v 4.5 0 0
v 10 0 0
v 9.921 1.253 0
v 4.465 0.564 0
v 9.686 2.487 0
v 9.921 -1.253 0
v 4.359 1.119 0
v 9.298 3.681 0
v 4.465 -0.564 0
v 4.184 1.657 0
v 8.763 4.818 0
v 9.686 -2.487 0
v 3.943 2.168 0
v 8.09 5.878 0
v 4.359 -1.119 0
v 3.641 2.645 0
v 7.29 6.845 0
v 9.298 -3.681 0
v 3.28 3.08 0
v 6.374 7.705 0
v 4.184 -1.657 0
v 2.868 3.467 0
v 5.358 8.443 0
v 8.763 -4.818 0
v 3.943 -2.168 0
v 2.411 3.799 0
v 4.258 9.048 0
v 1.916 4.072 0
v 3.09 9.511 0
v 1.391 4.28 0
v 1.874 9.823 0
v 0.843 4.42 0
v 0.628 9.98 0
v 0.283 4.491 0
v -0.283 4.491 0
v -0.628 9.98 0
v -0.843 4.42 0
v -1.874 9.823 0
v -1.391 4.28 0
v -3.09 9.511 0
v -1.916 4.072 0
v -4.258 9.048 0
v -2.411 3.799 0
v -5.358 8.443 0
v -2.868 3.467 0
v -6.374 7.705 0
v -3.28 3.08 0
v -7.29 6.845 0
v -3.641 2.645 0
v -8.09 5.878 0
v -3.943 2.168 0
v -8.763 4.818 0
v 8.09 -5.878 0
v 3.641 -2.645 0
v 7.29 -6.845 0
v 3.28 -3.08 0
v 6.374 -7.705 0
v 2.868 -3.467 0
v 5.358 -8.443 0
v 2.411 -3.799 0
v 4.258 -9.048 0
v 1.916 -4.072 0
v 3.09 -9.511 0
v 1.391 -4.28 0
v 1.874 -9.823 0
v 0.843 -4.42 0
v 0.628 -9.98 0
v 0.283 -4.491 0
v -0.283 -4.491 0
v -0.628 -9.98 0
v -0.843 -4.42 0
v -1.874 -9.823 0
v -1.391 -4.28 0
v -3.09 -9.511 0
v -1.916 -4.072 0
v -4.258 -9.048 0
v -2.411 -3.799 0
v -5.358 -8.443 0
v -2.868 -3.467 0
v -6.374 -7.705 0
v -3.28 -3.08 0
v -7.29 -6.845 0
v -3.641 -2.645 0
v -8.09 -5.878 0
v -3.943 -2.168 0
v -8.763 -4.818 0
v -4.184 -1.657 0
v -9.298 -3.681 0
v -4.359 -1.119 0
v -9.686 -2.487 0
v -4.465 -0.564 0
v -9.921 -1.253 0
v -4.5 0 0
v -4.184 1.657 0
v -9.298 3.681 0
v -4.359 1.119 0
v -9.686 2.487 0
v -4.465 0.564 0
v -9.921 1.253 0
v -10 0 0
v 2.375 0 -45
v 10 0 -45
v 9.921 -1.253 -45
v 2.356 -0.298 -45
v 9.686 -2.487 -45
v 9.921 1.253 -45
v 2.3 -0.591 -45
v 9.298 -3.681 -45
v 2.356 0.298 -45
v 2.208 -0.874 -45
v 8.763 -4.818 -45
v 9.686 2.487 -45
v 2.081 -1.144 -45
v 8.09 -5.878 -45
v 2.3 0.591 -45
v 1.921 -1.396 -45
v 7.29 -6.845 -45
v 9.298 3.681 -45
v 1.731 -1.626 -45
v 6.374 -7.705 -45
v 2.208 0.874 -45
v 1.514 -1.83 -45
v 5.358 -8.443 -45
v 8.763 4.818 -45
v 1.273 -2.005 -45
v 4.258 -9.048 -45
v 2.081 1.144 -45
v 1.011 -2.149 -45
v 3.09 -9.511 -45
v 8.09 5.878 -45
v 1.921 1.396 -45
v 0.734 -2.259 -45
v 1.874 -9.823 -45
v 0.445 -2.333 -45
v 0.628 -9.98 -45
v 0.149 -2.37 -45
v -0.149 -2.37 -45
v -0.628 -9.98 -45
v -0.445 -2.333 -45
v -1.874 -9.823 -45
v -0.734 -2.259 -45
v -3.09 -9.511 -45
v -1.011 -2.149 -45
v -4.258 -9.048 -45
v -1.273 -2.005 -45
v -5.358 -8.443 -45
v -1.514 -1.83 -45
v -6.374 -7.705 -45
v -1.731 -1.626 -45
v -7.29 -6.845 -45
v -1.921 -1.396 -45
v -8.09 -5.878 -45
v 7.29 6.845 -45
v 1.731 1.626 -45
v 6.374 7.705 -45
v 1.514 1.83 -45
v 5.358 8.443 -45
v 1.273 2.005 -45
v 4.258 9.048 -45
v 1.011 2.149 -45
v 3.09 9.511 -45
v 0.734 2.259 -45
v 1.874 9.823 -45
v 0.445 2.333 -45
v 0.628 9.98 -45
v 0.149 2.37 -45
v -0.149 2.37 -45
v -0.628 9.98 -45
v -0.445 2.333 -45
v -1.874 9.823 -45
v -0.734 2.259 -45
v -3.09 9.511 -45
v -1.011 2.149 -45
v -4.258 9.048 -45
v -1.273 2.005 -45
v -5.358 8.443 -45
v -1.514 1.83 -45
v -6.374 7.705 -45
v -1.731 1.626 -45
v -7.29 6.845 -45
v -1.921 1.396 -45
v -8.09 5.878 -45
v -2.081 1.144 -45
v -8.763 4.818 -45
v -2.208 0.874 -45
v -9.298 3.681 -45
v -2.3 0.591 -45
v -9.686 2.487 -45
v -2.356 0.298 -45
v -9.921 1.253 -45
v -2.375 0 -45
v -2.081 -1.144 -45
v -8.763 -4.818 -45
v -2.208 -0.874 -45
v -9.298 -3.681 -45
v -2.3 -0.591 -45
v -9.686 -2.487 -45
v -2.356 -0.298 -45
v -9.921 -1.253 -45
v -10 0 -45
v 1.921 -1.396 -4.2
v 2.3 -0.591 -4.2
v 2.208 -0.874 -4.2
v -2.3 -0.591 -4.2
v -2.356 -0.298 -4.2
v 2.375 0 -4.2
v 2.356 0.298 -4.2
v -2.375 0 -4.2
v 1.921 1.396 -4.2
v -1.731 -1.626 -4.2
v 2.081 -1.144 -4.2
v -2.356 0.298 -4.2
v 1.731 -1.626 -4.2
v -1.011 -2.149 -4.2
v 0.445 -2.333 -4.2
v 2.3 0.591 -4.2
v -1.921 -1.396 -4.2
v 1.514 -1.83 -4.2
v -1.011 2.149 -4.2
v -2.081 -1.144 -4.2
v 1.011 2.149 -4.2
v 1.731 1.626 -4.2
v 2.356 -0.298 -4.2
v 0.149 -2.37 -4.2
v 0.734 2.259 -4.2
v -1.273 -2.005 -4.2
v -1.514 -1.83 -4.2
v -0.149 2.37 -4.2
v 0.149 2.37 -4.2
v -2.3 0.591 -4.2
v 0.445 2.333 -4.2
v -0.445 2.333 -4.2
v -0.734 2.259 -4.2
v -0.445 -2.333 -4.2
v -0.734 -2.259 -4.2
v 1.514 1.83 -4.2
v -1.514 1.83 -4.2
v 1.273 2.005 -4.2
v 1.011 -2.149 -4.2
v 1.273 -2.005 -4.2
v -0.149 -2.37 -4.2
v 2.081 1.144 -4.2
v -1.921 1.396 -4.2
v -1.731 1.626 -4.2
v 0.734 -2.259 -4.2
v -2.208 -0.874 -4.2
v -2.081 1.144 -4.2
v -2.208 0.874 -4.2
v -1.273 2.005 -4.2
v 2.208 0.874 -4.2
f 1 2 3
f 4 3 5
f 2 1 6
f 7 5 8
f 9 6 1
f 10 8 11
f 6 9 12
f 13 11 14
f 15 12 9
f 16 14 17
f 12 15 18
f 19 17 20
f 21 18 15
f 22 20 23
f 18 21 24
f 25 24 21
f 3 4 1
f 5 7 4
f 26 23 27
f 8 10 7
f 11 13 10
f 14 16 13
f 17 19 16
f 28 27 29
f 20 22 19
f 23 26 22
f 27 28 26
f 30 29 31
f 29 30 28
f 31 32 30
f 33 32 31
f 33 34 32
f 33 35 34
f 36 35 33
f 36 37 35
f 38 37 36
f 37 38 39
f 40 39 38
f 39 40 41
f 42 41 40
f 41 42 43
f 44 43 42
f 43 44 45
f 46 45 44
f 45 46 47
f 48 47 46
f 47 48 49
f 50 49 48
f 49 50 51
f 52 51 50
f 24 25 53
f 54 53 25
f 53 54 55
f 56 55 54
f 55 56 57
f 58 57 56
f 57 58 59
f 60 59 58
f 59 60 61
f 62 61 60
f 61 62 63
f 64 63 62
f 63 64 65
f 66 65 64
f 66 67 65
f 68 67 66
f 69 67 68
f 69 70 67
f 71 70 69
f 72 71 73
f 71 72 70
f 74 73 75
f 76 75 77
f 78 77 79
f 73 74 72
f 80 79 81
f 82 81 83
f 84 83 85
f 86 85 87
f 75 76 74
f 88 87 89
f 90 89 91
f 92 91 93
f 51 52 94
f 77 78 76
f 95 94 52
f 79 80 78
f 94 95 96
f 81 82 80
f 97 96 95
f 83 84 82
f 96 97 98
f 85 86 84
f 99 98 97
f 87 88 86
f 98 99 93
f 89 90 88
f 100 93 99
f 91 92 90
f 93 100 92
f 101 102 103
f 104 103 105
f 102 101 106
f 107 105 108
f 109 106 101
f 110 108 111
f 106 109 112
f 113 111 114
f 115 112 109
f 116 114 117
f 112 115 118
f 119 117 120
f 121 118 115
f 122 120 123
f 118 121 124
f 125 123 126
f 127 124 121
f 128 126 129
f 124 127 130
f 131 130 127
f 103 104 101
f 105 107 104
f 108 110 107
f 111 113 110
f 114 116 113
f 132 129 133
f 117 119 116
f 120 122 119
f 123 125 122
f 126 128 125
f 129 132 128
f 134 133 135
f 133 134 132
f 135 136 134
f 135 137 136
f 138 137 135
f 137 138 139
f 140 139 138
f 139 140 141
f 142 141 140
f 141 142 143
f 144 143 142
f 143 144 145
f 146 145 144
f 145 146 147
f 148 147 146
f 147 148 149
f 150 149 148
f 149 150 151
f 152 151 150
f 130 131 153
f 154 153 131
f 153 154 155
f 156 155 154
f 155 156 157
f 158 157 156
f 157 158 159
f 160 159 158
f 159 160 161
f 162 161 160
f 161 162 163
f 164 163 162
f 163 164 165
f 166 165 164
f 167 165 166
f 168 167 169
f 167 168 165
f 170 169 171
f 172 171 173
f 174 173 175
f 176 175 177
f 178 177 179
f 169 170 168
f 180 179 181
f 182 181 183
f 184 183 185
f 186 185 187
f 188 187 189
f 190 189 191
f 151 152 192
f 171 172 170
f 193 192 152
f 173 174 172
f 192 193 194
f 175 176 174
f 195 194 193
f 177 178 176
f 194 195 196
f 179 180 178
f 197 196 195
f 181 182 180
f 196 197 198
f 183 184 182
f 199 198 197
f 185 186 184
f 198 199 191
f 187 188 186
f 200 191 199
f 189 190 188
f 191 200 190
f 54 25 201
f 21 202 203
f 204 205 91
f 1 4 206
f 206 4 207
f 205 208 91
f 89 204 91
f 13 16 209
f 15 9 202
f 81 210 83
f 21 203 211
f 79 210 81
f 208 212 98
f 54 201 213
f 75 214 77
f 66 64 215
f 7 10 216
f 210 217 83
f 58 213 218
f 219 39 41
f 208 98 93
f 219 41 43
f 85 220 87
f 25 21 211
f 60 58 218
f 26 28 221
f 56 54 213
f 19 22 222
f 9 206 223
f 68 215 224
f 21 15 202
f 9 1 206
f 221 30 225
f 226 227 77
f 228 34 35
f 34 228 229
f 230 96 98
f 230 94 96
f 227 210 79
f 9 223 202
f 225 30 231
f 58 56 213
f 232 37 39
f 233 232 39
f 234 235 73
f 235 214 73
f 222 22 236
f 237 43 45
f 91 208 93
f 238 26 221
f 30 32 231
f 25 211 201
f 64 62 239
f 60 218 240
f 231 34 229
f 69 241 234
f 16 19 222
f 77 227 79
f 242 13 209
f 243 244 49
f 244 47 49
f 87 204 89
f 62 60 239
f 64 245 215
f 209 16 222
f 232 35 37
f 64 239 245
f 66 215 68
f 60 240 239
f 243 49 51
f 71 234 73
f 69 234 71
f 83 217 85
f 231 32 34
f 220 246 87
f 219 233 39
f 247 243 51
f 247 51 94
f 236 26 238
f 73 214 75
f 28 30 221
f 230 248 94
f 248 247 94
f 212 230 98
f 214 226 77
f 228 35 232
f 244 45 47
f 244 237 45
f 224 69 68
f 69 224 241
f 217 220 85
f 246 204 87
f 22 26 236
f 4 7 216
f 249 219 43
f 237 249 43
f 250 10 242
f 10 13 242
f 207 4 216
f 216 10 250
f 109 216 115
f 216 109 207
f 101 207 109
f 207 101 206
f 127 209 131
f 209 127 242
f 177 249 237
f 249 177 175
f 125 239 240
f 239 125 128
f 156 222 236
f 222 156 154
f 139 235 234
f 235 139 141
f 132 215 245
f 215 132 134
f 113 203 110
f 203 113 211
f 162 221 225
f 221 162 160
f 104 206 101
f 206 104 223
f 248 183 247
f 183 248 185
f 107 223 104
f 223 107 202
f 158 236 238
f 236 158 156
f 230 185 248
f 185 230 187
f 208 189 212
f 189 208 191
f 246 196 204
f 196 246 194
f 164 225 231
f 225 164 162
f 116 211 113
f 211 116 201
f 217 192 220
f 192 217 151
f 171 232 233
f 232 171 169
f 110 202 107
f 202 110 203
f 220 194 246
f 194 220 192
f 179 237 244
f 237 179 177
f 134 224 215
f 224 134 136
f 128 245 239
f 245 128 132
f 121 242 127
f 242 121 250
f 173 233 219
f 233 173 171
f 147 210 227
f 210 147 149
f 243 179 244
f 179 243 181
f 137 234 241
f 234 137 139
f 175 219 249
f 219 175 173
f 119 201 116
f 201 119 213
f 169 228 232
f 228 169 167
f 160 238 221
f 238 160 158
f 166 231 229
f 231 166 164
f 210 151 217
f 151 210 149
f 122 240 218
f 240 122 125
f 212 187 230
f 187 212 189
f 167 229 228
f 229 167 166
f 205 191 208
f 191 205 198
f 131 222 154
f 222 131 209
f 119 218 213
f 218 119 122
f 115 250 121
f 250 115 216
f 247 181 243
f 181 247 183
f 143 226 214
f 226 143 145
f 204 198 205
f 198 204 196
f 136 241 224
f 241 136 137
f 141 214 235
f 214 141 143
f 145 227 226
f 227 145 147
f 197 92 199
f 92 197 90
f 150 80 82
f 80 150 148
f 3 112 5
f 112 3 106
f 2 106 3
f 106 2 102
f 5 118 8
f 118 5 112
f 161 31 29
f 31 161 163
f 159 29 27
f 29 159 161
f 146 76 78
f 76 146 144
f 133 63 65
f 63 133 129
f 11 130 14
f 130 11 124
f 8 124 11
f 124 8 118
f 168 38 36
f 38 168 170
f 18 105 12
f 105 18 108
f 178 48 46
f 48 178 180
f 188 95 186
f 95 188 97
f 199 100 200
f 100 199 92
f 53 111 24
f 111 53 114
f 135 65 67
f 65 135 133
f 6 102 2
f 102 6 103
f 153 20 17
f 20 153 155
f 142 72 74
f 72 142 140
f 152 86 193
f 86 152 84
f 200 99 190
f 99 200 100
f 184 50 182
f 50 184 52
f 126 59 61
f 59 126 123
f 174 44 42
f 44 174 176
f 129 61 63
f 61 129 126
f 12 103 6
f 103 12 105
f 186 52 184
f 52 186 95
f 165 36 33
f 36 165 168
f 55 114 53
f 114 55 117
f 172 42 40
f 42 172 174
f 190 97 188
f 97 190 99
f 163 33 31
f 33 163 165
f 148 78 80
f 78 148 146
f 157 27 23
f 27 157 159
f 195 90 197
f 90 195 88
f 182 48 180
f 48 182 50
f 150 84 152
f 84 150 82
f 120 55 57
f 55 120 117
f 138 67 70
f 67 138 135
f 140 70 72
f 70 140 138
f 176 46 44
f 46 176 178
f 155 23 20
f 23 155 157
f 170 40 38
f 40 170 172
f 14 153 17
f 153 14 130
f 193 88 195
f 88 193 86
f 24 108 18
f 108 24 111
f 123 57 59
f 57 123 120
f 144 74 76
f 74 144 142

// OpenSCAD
$fn = 50;


difference() {
	union() {
		translate(v = [0, 0, -45.0000000000]) {
			cylinder(h = 45, r = 10.0000000000);
		}
		cylinder(h = 0, r = 19.0000000000);
	}
	union() {
		translate(v = [0, 0, 0]) {
			rotate(a = [0, 0, 0]) {
				difference() {
					union() {
						#translate(v = [0, 0, -45.0000000000]) {
							cylinder(h = 45, r = 2.2500000000);
						}
						#translate(v = [0, 0, -4.2000000000]) {
							cylinder(h = 4.2000000000, r = 10.0000000000, r1 = 2.3750000000, r2 = 4.5000000000);
						}
						#translate(v = [0, 0, -45.0000000000]) {
							cylinder(h = 45, r = 2.3750000000);
						}
						#translate(v = [0, 0, -45.0000000000]) {
							cylinder(h = 45, r = 2.2500000000);
						}
					}
					union();
				}
			}
		}
	}
}
